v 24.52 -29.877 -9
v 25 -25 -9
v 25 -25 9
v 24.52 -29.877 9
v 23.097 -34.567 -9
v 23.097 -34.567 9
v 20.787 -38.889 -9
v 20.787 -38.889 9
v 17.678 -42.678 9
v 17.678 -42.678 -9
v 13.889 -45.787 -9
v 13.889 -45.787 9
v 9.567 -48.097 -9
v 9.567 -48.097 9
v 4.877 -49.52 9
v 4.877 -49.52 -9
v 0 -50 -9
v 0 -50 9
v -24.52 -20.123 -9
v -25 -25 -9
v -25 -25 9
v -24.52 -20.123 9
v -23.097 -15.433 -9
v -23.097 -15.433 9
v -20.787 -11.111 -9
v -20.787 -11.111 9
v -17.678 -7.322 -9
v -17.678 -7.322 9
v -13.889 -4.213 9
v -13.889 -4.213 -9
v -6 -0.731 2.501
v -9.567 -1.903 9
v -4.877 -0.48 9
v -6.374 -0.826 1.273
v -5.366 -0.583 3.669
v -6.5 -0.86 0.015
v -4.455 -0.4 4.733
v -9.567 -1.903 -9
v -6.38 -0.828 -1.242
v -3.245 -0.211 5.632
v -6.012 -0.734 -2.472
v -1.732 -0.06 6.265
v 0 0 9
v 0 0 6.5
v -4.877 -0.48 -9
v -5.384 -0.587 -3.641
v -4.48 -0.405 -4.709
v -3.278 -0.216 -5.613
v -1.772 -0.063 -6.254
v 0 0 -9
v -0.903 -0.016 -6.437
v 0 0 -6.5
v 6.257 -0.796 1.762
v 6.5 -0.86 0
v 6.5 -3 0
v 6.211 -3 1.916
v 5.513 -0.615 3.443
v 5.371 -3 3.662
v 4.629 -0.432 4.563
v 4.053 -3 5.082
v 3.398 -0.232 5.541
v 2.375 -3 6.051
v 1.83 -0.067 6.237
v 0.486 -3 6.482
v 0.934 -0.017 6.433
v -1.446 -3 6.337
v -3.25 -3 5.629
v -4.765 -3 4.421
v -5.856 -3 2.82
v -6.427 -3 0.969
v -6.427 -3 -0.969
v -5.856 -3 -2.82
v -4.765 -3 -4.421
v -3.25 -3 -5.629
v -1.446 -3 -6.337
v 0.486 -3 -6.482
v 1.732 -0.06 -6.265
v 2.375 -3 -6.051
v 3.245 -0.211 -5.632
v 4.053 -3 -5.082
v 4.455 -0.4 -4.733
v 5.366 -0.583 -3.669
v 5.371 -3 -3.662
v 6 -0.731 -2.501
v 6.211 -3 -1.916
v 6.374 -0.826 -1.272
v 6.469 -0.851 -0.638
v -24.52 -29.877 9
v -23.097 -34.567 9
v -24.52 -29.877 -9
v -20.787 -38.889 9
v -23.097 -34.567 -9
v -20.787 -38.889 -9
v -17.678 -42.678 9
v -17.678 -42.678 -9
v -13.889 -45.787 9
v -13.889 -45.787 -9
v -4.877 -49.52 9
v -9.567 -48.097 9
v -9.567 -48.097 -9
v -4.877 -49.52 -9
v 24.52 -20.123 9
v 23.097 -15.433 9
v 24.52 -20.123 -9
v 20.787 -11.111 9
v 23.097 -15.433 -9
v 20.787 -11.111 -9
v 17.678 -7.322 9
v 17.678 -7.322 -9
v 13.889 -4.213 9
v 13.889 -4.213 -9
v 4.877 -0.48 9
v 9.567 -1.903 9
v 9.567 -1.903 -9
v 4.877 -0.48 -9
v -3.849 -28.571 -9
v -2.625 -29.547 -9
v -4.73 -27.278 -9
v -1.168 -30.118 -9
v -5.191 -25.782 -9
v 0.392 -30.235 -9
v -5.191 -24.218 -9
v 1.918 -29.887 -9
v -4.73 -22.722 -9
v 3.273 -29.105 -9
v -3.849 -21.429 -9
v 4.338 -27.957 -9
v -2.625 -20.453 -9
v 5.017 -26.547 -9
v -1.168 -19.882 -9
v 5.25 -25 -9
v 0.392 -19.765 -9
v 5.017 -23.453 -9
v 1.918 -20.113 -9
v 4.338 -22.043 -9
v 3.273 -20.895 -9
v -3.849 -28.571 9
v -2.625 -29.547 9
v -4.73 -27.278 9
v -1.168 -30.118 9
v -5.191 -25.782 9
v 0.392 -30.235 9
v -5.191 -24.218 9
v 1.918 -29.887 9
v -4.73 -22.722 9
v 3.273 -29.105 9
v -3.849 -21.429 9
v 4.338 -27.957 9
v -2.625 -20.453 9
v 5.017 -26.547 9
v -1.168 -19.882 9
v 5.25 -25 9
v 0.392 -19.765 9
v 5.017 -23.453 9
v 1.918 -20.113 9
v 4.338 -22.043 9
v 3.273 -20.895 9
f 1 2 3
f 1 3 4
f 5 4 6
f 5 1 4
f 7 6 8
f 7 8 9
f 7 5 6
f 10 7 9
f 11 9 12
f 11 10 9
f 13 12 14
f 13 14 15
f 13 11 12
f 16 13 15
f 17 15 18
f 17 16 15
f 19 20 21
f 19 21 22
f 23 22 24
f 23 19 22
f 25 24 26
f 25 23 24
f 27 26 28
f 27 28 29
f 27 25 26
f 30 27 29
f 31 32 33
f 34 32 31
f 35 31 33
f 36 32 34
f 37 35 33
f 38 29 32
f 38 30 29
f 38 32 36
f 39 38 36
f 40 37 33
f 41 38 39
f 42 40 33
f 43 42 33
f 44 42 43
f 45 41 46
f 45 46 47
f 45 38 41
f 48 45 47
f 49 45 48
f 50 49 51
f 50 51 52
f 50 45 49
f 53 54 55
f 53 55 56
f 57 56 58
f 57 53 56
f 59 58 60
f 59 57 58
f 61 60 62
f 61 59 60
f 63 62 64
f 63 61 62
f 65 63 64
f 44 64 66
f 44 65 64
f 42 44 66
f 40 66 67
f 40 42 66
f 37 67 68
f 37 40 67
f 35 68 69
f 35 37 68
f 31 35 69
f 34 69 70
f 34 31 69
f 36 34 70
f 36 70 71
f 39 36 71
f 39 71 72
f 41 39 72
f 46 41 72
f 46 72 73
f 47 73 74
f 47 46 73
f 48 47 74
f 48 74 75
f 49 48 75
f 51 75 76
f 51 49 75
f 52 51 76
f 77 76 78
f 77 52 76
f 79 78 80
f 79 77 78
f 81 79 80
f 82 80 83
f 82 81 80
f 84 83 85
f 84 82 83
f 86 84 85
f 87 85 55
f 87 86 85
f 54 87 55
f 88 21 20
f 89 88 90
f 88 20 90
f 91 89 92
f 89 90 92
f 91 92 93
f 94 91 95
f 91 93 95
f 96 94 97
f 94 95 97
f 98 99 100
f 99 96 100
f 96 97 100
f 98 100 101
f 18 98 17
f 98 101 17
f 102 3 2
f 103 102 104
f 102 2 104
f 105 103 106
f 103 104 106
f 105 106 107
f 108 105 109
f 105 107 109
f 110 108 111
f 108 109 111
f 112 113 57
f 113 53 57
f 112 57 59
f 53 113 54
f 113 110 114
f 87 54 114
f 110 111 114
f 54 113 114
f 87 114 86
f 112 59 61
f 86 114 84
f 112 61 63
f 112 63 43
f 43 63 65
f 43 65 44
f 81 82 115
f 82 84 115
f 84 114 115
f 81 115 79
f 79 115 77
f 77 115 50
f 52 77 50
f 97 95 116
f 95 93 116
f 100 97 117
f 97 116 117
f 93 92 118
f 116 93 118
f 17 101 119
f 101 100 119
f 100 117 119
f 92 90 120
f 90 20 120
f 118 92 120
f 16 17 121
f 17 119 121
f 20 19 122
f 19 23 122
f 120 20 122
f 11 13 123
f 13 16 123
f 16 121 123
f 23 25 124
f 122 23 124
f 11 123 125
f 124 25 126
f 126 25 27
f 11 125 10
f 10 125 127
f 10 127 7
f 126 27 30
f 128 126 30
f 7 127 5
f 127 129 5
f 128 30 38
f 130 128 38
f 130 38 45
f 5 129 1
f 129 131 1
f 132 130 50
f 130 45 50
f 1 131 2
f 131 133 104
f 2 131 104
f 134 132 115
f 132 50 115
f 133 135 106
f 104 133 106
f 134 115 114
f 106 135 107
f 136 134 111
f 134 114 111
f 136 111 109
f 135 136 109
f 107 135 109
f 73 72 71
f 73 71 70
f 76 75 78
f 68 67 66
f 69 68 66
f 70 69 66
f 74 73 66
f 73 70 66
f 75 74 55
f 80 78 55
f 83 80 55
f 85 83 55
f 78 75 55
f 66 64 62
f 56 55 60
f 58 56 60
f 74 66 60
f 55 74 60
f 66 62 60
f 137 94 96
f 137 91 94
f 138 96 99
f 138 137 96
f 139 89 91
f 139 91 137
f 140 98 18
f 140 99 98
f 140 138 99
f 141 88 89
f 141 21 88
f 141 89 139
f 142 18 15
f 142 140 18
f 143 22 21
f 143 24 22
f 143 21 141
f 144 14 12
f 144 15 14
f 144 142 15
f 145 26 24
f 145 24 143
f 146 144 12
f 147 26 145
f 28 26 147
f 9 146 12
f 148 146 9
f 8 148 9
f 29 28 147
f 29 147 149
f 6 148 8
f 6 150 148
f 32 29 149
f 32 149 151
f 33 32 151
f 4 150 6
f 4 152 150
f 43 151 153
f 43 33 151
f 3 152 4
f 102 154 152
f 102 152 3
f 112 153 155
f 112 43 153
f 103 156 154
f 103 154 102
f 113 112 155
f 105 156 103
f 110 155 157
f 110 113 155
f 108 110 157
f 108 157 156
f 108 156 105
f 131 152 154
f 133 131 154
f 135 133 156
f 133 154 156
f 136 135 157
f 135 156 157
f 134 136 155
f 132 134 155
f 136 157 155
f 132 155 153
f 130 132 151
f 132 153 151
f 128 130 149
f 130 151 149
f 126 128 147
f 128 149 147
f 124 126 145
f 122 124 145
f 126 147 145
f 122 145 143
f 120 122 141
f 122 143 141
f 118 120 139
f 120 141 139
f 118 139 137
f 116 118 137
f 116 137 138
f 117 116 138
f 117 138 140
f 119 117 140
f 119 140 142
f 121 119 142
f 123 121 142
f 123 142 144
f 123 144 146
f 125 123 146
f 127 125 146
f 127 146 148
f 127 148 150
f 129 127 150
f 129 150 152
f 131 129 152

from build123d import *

# Parameters (mm, degrees)
F0_W        = 50
F0_H        = 18
F0_R        = 6.5
F1_DEPTH    = 50
F2_R        = 6.5
F3_DEPTH    = 3
F4_T1_DEPTH = 143
F5_R        = 5.25
F6_DEPTH    = 25


# Not quite as in the source:
# - a fillet or chamfer that OpenCascade refuses, or shapes differently, is made with other operations: its cross-section is extruded or revolved along the edge and cut away or added


with BuildPart() as f1:
    # F0 (on Front) → F1 (new body)
    with BuildSketch(Plane.XZ):
        Rectangle(F0_W, F0_H)
        Circle(F0_R, mode=Mode.SUBTRACT)
        Circle(F0_R)
    extrude(amount=F1_DEPTH)

    # F2 (on Front) → F3 (cut)
    with BuildSketch(Plane.XZ):
        Circle(F2_R)
    extrude(amount=F3_DEPTH, mode=Mode.SUBTRACT)

    # F4: fillet of radius 25 on 4 edges, made by hand

    # F4_s2 → F4_t1 (cut)
    with BuildSketch(Plane.XY.offset(-71.5)):
        with BuildLine():
            ThreePointArc((-25, -25), (-17.6776695297, -7.3223304703), (0, 0))
            Line((0, 0), (-25, 0))
            Line((-25, 0), (-25, -25))
        make_face()
        with BuildLine():
            ThreePointArc((25, -25), (17.6776695297, -7.3223304703), (0, 0))
            Line((0, 0), (25, 0))
            Line((25, 0), (25, -25))
        make_face()
        with BuildLine():
            ThreePointArc((25, -25), (17.6776695297, -42.6776695297), (0, -50))
            Line((0, -50), (25, -50))
            Line((25, -50), (25, -25))
        make_face()
        with BuildLine():
            ThreePointArc((-25, -25), (-17.6776695297, -42.6776695297), (0, -50))
            Line((0, -50), (-25, -50))
            Line((-25, -50), (-25, -25))
        make_face()
    extrude(amount=F4_T1_DEPTH, mode=Mode.SUBTRACT)

    # F5 (on face) → F6 (cut)
    with BuildSketch(Plane.XY.offset(9)):
        with Locations((0, -25)):
            Circle(F5_R)
    extrude(amount=-F6_DEPTH, mode=Mode.SUBTRACT)


solid = f1.part
